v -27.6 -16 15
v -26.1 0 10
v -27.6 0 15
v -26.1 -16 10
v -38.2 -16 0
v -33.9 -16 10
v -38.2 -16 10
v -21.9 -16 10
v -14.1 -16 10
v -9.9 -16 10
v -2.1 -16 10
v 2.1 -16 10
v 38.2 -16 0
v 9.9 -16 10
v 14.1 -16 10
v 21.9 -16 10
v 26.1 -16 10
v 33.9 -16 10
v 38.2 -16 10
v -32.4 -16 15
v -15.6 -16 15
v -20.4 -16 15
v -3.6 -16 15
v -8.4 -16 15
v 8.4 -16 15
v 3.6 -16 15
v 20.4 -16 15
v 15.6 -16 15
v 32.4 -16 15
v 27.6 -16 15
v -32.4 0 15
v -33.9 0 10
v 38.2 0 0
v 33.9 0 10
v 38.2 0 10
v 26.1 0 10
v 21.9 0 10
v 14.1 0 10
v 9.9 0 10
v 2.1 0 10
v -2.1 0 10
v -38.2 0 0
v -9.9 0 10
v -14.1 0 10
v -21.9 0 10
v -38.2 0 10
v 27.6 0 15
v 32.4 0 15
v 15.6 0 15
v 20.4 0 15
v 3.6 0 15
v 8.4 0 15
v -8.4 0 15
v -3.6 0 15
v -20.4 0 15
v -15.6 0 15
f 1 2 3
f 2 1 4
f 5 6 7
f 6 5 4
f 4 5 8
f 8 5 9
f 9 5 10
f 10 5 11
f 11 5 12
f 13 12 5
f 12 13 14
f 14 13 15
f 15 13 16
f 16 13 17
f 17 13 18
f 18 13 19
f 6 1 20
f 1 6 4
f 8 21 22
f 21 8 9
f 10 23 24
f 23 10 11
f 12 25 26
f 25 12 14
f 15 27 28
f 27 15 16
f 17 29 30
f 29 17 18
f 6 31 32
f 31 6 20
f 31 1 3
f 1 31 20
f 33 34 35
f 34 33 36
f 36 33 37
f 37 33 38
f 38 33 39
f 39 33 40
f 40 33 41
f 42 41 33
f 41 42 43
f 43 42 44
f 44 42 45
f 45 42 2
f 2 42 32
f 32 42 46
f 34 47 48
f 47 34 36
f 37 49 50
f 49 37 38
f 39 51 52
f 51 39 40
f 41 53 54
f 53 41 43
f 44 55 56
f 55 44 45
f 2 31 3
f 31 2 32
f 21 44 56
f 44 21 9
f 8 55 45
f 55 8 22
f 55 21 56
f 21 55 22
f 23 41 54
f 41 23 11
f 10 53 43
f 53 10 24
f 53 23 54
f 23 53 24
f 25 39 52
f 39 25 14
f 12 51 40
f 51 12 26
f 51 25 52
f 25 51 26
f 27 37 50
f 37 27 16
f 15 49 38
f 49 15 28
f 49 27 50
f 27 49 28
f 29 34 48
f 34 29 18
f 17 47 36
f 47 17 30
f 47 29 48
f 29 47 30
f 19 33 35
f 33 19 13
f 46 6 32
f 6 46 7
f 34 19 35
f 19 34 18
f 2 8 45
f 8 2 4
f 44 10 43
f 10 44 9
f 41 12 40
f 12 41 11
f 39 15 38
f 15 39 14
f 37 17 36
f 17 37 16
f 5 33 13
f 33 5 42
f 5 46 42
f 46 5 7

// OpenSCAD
$fn = 32;

// ----------------------------------------------------------------------
// Toothed rack, 6 teeth
// 12 mm pitch, 5 mm teeth
// ----------------------------------------------------------------------

// --- parameters (mm) ---
bar_w = 16;     // bar width (Y)
bar_h = 10;     // bar height (Z)
teeth = 6;      // number of teeth
pitch = 12;     // tooth pitch
tooth_h = 5;    // tooth height above the bar
root_w = 8.4;   // tooth width at the root
crest_w = 4.8;  // tooth width at the crest

// --- derived feature positions (mm) ---
span = (teeth - 1) * pitch;  // = 60   distance between the outer teeth
bar_l = span + root_w + 8;   // = 76.4   bar length: teeth plus 4 mm at each end
tooth_x = -span / 2;         // = -30   X of the first tooth
height = bar_h + tooth_h;    // = 15   overall height
feature_centers = [
  [tooth_x + 0 * pitch, -bar_w / 2],
  [tooth_x + 1 * pitch, -bar_w / 2],
  [tooth_x + 2 * pitch, -bar_w / 2],
  [tooth_x + 3 * pitch, -bar_w / 2],
  [tooth_x + 4 * pitch, -bar_w / 2],
  [tooth_x + 5 * pitch, -bar_w / 2]
];   // tooth centre line, drives the tooth loop

// bar with a rack of teeth, one extruded trapezoium per centre
module rack_tooth() {
  linear_extrude(height = bar_w)
    polygon(points = [
      [0, 0],
      [root_w, 0],
      [root_w / 2 + crest_w / 2, tooth_h + 1],
      [root_w / 2 - crest_w / 2, tooth_h + 1]
    ]);
}

union() {
  translate([-bar_l / 2, -bar_w, 0]) cube([bar_l, bar_w, bar_h]);
  for (centre = feature_centers)
    translate([centre[0] - root_w / 2, 0, bar_h - 1]) rotate([90, 0, 0]) rack_tooth();
}
